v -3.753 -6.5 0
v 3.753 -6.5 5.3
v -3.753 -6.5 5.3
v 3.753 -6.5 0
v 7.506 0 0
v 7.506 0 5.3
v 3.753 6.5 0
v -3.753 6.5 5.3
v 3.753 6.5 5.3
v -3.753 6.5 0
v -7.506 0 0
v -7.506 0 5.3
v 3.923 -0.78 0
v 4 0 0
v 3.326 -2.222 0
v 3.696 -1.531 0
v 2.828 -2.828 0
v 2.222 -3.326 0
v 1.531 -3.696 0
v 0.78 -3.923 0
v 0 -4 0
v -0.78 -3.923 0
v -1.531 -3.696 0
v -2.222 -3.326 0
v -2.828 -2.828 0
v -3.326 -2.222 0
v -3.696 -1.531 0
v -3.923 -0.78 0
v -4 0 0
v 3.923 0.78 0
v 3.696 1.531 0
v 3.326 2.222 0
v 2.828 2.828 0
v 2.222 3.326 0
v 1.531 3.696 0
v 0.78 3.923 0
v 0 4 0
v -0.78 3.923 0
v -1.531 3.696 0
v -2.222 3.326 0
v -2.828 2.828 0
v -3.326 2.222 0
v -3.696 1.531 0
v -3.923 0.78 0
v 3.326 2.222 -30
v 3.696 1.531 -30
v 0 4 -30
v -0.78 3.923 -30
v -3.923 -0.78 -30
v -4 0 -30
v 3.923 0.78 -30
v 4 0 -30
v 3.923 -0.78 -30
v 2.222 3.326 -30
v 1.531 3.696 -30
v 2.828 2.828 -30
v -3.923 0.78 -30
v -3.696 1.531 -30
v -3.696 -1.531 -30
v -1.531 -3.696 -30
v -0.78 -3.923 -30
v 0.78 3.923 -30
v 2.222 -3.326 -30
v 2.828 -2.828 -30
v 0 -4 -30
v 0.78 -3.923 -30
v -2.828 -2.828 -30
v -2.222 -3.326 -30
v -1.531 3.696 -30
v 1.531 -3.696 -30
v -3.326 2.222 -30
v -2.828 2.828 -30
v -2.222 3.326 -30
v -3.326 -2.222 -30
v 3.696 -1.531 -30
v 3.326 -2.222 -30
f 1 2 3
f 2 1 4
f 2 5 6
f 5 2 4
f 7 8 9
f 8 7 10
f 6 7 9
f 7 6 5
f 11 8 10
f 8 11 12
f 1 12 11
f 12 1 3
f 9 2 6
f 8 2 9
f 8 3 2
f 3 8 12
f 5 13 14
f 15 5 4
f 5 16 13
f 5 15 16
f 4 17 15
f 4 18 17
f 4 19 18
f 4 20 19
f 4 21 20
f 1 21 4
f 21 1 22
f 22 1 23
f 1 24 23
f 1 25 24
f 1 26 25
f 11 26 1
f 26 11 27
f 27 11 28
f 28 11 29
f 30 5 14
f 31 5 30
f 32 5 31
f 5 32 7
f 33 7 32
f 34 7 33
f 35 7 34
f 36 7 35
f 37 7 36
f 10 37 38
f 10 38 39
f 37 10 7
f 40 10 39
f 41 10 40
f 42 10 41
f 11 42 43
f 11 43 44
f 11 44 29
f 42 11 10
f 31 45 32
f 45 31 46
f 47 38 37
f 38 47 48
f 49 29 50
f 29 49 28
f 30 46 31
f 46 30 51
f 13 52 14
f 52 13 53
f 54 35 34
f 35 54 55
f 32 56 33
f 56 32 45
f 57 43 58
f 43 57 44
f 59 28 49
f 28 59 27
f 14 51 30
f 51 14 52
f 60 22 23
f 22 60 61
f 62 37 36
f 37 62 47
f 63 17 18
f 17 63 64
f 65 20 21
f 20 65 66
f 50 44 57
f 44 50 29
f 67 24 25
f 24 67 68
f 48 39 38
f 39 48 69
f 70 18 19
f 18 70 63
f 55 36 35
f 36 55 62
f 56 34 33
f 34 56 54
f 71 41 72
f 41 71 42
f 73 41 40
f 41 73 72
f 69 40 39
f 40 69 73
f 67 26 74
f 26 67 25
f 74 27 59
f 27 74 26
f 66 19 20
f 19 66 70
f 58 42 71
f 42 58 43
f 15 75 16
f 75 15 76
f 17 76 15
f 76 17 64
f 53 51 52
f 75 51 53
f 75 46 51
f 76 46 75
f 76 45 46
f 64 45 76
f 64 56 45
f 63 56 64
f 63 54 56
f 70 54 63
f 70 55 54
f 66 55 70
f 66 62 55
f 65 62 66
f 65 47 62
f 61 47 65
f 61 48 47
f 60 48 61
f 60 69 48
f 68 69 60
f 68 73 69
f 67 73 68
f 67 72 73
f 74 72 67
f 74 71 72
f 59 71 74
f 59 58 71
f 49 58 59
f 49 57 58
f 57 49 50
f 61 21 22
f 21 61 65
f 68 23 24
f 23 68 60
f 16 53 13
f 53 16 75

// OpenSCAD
// M8 hex bolt
// Head
cylinder(h=5.3, d=13/cos(30), $fn=6);

// Shank
translate([0, 0, -30])
    cylinder(h=30, d=8, $fn=32);
